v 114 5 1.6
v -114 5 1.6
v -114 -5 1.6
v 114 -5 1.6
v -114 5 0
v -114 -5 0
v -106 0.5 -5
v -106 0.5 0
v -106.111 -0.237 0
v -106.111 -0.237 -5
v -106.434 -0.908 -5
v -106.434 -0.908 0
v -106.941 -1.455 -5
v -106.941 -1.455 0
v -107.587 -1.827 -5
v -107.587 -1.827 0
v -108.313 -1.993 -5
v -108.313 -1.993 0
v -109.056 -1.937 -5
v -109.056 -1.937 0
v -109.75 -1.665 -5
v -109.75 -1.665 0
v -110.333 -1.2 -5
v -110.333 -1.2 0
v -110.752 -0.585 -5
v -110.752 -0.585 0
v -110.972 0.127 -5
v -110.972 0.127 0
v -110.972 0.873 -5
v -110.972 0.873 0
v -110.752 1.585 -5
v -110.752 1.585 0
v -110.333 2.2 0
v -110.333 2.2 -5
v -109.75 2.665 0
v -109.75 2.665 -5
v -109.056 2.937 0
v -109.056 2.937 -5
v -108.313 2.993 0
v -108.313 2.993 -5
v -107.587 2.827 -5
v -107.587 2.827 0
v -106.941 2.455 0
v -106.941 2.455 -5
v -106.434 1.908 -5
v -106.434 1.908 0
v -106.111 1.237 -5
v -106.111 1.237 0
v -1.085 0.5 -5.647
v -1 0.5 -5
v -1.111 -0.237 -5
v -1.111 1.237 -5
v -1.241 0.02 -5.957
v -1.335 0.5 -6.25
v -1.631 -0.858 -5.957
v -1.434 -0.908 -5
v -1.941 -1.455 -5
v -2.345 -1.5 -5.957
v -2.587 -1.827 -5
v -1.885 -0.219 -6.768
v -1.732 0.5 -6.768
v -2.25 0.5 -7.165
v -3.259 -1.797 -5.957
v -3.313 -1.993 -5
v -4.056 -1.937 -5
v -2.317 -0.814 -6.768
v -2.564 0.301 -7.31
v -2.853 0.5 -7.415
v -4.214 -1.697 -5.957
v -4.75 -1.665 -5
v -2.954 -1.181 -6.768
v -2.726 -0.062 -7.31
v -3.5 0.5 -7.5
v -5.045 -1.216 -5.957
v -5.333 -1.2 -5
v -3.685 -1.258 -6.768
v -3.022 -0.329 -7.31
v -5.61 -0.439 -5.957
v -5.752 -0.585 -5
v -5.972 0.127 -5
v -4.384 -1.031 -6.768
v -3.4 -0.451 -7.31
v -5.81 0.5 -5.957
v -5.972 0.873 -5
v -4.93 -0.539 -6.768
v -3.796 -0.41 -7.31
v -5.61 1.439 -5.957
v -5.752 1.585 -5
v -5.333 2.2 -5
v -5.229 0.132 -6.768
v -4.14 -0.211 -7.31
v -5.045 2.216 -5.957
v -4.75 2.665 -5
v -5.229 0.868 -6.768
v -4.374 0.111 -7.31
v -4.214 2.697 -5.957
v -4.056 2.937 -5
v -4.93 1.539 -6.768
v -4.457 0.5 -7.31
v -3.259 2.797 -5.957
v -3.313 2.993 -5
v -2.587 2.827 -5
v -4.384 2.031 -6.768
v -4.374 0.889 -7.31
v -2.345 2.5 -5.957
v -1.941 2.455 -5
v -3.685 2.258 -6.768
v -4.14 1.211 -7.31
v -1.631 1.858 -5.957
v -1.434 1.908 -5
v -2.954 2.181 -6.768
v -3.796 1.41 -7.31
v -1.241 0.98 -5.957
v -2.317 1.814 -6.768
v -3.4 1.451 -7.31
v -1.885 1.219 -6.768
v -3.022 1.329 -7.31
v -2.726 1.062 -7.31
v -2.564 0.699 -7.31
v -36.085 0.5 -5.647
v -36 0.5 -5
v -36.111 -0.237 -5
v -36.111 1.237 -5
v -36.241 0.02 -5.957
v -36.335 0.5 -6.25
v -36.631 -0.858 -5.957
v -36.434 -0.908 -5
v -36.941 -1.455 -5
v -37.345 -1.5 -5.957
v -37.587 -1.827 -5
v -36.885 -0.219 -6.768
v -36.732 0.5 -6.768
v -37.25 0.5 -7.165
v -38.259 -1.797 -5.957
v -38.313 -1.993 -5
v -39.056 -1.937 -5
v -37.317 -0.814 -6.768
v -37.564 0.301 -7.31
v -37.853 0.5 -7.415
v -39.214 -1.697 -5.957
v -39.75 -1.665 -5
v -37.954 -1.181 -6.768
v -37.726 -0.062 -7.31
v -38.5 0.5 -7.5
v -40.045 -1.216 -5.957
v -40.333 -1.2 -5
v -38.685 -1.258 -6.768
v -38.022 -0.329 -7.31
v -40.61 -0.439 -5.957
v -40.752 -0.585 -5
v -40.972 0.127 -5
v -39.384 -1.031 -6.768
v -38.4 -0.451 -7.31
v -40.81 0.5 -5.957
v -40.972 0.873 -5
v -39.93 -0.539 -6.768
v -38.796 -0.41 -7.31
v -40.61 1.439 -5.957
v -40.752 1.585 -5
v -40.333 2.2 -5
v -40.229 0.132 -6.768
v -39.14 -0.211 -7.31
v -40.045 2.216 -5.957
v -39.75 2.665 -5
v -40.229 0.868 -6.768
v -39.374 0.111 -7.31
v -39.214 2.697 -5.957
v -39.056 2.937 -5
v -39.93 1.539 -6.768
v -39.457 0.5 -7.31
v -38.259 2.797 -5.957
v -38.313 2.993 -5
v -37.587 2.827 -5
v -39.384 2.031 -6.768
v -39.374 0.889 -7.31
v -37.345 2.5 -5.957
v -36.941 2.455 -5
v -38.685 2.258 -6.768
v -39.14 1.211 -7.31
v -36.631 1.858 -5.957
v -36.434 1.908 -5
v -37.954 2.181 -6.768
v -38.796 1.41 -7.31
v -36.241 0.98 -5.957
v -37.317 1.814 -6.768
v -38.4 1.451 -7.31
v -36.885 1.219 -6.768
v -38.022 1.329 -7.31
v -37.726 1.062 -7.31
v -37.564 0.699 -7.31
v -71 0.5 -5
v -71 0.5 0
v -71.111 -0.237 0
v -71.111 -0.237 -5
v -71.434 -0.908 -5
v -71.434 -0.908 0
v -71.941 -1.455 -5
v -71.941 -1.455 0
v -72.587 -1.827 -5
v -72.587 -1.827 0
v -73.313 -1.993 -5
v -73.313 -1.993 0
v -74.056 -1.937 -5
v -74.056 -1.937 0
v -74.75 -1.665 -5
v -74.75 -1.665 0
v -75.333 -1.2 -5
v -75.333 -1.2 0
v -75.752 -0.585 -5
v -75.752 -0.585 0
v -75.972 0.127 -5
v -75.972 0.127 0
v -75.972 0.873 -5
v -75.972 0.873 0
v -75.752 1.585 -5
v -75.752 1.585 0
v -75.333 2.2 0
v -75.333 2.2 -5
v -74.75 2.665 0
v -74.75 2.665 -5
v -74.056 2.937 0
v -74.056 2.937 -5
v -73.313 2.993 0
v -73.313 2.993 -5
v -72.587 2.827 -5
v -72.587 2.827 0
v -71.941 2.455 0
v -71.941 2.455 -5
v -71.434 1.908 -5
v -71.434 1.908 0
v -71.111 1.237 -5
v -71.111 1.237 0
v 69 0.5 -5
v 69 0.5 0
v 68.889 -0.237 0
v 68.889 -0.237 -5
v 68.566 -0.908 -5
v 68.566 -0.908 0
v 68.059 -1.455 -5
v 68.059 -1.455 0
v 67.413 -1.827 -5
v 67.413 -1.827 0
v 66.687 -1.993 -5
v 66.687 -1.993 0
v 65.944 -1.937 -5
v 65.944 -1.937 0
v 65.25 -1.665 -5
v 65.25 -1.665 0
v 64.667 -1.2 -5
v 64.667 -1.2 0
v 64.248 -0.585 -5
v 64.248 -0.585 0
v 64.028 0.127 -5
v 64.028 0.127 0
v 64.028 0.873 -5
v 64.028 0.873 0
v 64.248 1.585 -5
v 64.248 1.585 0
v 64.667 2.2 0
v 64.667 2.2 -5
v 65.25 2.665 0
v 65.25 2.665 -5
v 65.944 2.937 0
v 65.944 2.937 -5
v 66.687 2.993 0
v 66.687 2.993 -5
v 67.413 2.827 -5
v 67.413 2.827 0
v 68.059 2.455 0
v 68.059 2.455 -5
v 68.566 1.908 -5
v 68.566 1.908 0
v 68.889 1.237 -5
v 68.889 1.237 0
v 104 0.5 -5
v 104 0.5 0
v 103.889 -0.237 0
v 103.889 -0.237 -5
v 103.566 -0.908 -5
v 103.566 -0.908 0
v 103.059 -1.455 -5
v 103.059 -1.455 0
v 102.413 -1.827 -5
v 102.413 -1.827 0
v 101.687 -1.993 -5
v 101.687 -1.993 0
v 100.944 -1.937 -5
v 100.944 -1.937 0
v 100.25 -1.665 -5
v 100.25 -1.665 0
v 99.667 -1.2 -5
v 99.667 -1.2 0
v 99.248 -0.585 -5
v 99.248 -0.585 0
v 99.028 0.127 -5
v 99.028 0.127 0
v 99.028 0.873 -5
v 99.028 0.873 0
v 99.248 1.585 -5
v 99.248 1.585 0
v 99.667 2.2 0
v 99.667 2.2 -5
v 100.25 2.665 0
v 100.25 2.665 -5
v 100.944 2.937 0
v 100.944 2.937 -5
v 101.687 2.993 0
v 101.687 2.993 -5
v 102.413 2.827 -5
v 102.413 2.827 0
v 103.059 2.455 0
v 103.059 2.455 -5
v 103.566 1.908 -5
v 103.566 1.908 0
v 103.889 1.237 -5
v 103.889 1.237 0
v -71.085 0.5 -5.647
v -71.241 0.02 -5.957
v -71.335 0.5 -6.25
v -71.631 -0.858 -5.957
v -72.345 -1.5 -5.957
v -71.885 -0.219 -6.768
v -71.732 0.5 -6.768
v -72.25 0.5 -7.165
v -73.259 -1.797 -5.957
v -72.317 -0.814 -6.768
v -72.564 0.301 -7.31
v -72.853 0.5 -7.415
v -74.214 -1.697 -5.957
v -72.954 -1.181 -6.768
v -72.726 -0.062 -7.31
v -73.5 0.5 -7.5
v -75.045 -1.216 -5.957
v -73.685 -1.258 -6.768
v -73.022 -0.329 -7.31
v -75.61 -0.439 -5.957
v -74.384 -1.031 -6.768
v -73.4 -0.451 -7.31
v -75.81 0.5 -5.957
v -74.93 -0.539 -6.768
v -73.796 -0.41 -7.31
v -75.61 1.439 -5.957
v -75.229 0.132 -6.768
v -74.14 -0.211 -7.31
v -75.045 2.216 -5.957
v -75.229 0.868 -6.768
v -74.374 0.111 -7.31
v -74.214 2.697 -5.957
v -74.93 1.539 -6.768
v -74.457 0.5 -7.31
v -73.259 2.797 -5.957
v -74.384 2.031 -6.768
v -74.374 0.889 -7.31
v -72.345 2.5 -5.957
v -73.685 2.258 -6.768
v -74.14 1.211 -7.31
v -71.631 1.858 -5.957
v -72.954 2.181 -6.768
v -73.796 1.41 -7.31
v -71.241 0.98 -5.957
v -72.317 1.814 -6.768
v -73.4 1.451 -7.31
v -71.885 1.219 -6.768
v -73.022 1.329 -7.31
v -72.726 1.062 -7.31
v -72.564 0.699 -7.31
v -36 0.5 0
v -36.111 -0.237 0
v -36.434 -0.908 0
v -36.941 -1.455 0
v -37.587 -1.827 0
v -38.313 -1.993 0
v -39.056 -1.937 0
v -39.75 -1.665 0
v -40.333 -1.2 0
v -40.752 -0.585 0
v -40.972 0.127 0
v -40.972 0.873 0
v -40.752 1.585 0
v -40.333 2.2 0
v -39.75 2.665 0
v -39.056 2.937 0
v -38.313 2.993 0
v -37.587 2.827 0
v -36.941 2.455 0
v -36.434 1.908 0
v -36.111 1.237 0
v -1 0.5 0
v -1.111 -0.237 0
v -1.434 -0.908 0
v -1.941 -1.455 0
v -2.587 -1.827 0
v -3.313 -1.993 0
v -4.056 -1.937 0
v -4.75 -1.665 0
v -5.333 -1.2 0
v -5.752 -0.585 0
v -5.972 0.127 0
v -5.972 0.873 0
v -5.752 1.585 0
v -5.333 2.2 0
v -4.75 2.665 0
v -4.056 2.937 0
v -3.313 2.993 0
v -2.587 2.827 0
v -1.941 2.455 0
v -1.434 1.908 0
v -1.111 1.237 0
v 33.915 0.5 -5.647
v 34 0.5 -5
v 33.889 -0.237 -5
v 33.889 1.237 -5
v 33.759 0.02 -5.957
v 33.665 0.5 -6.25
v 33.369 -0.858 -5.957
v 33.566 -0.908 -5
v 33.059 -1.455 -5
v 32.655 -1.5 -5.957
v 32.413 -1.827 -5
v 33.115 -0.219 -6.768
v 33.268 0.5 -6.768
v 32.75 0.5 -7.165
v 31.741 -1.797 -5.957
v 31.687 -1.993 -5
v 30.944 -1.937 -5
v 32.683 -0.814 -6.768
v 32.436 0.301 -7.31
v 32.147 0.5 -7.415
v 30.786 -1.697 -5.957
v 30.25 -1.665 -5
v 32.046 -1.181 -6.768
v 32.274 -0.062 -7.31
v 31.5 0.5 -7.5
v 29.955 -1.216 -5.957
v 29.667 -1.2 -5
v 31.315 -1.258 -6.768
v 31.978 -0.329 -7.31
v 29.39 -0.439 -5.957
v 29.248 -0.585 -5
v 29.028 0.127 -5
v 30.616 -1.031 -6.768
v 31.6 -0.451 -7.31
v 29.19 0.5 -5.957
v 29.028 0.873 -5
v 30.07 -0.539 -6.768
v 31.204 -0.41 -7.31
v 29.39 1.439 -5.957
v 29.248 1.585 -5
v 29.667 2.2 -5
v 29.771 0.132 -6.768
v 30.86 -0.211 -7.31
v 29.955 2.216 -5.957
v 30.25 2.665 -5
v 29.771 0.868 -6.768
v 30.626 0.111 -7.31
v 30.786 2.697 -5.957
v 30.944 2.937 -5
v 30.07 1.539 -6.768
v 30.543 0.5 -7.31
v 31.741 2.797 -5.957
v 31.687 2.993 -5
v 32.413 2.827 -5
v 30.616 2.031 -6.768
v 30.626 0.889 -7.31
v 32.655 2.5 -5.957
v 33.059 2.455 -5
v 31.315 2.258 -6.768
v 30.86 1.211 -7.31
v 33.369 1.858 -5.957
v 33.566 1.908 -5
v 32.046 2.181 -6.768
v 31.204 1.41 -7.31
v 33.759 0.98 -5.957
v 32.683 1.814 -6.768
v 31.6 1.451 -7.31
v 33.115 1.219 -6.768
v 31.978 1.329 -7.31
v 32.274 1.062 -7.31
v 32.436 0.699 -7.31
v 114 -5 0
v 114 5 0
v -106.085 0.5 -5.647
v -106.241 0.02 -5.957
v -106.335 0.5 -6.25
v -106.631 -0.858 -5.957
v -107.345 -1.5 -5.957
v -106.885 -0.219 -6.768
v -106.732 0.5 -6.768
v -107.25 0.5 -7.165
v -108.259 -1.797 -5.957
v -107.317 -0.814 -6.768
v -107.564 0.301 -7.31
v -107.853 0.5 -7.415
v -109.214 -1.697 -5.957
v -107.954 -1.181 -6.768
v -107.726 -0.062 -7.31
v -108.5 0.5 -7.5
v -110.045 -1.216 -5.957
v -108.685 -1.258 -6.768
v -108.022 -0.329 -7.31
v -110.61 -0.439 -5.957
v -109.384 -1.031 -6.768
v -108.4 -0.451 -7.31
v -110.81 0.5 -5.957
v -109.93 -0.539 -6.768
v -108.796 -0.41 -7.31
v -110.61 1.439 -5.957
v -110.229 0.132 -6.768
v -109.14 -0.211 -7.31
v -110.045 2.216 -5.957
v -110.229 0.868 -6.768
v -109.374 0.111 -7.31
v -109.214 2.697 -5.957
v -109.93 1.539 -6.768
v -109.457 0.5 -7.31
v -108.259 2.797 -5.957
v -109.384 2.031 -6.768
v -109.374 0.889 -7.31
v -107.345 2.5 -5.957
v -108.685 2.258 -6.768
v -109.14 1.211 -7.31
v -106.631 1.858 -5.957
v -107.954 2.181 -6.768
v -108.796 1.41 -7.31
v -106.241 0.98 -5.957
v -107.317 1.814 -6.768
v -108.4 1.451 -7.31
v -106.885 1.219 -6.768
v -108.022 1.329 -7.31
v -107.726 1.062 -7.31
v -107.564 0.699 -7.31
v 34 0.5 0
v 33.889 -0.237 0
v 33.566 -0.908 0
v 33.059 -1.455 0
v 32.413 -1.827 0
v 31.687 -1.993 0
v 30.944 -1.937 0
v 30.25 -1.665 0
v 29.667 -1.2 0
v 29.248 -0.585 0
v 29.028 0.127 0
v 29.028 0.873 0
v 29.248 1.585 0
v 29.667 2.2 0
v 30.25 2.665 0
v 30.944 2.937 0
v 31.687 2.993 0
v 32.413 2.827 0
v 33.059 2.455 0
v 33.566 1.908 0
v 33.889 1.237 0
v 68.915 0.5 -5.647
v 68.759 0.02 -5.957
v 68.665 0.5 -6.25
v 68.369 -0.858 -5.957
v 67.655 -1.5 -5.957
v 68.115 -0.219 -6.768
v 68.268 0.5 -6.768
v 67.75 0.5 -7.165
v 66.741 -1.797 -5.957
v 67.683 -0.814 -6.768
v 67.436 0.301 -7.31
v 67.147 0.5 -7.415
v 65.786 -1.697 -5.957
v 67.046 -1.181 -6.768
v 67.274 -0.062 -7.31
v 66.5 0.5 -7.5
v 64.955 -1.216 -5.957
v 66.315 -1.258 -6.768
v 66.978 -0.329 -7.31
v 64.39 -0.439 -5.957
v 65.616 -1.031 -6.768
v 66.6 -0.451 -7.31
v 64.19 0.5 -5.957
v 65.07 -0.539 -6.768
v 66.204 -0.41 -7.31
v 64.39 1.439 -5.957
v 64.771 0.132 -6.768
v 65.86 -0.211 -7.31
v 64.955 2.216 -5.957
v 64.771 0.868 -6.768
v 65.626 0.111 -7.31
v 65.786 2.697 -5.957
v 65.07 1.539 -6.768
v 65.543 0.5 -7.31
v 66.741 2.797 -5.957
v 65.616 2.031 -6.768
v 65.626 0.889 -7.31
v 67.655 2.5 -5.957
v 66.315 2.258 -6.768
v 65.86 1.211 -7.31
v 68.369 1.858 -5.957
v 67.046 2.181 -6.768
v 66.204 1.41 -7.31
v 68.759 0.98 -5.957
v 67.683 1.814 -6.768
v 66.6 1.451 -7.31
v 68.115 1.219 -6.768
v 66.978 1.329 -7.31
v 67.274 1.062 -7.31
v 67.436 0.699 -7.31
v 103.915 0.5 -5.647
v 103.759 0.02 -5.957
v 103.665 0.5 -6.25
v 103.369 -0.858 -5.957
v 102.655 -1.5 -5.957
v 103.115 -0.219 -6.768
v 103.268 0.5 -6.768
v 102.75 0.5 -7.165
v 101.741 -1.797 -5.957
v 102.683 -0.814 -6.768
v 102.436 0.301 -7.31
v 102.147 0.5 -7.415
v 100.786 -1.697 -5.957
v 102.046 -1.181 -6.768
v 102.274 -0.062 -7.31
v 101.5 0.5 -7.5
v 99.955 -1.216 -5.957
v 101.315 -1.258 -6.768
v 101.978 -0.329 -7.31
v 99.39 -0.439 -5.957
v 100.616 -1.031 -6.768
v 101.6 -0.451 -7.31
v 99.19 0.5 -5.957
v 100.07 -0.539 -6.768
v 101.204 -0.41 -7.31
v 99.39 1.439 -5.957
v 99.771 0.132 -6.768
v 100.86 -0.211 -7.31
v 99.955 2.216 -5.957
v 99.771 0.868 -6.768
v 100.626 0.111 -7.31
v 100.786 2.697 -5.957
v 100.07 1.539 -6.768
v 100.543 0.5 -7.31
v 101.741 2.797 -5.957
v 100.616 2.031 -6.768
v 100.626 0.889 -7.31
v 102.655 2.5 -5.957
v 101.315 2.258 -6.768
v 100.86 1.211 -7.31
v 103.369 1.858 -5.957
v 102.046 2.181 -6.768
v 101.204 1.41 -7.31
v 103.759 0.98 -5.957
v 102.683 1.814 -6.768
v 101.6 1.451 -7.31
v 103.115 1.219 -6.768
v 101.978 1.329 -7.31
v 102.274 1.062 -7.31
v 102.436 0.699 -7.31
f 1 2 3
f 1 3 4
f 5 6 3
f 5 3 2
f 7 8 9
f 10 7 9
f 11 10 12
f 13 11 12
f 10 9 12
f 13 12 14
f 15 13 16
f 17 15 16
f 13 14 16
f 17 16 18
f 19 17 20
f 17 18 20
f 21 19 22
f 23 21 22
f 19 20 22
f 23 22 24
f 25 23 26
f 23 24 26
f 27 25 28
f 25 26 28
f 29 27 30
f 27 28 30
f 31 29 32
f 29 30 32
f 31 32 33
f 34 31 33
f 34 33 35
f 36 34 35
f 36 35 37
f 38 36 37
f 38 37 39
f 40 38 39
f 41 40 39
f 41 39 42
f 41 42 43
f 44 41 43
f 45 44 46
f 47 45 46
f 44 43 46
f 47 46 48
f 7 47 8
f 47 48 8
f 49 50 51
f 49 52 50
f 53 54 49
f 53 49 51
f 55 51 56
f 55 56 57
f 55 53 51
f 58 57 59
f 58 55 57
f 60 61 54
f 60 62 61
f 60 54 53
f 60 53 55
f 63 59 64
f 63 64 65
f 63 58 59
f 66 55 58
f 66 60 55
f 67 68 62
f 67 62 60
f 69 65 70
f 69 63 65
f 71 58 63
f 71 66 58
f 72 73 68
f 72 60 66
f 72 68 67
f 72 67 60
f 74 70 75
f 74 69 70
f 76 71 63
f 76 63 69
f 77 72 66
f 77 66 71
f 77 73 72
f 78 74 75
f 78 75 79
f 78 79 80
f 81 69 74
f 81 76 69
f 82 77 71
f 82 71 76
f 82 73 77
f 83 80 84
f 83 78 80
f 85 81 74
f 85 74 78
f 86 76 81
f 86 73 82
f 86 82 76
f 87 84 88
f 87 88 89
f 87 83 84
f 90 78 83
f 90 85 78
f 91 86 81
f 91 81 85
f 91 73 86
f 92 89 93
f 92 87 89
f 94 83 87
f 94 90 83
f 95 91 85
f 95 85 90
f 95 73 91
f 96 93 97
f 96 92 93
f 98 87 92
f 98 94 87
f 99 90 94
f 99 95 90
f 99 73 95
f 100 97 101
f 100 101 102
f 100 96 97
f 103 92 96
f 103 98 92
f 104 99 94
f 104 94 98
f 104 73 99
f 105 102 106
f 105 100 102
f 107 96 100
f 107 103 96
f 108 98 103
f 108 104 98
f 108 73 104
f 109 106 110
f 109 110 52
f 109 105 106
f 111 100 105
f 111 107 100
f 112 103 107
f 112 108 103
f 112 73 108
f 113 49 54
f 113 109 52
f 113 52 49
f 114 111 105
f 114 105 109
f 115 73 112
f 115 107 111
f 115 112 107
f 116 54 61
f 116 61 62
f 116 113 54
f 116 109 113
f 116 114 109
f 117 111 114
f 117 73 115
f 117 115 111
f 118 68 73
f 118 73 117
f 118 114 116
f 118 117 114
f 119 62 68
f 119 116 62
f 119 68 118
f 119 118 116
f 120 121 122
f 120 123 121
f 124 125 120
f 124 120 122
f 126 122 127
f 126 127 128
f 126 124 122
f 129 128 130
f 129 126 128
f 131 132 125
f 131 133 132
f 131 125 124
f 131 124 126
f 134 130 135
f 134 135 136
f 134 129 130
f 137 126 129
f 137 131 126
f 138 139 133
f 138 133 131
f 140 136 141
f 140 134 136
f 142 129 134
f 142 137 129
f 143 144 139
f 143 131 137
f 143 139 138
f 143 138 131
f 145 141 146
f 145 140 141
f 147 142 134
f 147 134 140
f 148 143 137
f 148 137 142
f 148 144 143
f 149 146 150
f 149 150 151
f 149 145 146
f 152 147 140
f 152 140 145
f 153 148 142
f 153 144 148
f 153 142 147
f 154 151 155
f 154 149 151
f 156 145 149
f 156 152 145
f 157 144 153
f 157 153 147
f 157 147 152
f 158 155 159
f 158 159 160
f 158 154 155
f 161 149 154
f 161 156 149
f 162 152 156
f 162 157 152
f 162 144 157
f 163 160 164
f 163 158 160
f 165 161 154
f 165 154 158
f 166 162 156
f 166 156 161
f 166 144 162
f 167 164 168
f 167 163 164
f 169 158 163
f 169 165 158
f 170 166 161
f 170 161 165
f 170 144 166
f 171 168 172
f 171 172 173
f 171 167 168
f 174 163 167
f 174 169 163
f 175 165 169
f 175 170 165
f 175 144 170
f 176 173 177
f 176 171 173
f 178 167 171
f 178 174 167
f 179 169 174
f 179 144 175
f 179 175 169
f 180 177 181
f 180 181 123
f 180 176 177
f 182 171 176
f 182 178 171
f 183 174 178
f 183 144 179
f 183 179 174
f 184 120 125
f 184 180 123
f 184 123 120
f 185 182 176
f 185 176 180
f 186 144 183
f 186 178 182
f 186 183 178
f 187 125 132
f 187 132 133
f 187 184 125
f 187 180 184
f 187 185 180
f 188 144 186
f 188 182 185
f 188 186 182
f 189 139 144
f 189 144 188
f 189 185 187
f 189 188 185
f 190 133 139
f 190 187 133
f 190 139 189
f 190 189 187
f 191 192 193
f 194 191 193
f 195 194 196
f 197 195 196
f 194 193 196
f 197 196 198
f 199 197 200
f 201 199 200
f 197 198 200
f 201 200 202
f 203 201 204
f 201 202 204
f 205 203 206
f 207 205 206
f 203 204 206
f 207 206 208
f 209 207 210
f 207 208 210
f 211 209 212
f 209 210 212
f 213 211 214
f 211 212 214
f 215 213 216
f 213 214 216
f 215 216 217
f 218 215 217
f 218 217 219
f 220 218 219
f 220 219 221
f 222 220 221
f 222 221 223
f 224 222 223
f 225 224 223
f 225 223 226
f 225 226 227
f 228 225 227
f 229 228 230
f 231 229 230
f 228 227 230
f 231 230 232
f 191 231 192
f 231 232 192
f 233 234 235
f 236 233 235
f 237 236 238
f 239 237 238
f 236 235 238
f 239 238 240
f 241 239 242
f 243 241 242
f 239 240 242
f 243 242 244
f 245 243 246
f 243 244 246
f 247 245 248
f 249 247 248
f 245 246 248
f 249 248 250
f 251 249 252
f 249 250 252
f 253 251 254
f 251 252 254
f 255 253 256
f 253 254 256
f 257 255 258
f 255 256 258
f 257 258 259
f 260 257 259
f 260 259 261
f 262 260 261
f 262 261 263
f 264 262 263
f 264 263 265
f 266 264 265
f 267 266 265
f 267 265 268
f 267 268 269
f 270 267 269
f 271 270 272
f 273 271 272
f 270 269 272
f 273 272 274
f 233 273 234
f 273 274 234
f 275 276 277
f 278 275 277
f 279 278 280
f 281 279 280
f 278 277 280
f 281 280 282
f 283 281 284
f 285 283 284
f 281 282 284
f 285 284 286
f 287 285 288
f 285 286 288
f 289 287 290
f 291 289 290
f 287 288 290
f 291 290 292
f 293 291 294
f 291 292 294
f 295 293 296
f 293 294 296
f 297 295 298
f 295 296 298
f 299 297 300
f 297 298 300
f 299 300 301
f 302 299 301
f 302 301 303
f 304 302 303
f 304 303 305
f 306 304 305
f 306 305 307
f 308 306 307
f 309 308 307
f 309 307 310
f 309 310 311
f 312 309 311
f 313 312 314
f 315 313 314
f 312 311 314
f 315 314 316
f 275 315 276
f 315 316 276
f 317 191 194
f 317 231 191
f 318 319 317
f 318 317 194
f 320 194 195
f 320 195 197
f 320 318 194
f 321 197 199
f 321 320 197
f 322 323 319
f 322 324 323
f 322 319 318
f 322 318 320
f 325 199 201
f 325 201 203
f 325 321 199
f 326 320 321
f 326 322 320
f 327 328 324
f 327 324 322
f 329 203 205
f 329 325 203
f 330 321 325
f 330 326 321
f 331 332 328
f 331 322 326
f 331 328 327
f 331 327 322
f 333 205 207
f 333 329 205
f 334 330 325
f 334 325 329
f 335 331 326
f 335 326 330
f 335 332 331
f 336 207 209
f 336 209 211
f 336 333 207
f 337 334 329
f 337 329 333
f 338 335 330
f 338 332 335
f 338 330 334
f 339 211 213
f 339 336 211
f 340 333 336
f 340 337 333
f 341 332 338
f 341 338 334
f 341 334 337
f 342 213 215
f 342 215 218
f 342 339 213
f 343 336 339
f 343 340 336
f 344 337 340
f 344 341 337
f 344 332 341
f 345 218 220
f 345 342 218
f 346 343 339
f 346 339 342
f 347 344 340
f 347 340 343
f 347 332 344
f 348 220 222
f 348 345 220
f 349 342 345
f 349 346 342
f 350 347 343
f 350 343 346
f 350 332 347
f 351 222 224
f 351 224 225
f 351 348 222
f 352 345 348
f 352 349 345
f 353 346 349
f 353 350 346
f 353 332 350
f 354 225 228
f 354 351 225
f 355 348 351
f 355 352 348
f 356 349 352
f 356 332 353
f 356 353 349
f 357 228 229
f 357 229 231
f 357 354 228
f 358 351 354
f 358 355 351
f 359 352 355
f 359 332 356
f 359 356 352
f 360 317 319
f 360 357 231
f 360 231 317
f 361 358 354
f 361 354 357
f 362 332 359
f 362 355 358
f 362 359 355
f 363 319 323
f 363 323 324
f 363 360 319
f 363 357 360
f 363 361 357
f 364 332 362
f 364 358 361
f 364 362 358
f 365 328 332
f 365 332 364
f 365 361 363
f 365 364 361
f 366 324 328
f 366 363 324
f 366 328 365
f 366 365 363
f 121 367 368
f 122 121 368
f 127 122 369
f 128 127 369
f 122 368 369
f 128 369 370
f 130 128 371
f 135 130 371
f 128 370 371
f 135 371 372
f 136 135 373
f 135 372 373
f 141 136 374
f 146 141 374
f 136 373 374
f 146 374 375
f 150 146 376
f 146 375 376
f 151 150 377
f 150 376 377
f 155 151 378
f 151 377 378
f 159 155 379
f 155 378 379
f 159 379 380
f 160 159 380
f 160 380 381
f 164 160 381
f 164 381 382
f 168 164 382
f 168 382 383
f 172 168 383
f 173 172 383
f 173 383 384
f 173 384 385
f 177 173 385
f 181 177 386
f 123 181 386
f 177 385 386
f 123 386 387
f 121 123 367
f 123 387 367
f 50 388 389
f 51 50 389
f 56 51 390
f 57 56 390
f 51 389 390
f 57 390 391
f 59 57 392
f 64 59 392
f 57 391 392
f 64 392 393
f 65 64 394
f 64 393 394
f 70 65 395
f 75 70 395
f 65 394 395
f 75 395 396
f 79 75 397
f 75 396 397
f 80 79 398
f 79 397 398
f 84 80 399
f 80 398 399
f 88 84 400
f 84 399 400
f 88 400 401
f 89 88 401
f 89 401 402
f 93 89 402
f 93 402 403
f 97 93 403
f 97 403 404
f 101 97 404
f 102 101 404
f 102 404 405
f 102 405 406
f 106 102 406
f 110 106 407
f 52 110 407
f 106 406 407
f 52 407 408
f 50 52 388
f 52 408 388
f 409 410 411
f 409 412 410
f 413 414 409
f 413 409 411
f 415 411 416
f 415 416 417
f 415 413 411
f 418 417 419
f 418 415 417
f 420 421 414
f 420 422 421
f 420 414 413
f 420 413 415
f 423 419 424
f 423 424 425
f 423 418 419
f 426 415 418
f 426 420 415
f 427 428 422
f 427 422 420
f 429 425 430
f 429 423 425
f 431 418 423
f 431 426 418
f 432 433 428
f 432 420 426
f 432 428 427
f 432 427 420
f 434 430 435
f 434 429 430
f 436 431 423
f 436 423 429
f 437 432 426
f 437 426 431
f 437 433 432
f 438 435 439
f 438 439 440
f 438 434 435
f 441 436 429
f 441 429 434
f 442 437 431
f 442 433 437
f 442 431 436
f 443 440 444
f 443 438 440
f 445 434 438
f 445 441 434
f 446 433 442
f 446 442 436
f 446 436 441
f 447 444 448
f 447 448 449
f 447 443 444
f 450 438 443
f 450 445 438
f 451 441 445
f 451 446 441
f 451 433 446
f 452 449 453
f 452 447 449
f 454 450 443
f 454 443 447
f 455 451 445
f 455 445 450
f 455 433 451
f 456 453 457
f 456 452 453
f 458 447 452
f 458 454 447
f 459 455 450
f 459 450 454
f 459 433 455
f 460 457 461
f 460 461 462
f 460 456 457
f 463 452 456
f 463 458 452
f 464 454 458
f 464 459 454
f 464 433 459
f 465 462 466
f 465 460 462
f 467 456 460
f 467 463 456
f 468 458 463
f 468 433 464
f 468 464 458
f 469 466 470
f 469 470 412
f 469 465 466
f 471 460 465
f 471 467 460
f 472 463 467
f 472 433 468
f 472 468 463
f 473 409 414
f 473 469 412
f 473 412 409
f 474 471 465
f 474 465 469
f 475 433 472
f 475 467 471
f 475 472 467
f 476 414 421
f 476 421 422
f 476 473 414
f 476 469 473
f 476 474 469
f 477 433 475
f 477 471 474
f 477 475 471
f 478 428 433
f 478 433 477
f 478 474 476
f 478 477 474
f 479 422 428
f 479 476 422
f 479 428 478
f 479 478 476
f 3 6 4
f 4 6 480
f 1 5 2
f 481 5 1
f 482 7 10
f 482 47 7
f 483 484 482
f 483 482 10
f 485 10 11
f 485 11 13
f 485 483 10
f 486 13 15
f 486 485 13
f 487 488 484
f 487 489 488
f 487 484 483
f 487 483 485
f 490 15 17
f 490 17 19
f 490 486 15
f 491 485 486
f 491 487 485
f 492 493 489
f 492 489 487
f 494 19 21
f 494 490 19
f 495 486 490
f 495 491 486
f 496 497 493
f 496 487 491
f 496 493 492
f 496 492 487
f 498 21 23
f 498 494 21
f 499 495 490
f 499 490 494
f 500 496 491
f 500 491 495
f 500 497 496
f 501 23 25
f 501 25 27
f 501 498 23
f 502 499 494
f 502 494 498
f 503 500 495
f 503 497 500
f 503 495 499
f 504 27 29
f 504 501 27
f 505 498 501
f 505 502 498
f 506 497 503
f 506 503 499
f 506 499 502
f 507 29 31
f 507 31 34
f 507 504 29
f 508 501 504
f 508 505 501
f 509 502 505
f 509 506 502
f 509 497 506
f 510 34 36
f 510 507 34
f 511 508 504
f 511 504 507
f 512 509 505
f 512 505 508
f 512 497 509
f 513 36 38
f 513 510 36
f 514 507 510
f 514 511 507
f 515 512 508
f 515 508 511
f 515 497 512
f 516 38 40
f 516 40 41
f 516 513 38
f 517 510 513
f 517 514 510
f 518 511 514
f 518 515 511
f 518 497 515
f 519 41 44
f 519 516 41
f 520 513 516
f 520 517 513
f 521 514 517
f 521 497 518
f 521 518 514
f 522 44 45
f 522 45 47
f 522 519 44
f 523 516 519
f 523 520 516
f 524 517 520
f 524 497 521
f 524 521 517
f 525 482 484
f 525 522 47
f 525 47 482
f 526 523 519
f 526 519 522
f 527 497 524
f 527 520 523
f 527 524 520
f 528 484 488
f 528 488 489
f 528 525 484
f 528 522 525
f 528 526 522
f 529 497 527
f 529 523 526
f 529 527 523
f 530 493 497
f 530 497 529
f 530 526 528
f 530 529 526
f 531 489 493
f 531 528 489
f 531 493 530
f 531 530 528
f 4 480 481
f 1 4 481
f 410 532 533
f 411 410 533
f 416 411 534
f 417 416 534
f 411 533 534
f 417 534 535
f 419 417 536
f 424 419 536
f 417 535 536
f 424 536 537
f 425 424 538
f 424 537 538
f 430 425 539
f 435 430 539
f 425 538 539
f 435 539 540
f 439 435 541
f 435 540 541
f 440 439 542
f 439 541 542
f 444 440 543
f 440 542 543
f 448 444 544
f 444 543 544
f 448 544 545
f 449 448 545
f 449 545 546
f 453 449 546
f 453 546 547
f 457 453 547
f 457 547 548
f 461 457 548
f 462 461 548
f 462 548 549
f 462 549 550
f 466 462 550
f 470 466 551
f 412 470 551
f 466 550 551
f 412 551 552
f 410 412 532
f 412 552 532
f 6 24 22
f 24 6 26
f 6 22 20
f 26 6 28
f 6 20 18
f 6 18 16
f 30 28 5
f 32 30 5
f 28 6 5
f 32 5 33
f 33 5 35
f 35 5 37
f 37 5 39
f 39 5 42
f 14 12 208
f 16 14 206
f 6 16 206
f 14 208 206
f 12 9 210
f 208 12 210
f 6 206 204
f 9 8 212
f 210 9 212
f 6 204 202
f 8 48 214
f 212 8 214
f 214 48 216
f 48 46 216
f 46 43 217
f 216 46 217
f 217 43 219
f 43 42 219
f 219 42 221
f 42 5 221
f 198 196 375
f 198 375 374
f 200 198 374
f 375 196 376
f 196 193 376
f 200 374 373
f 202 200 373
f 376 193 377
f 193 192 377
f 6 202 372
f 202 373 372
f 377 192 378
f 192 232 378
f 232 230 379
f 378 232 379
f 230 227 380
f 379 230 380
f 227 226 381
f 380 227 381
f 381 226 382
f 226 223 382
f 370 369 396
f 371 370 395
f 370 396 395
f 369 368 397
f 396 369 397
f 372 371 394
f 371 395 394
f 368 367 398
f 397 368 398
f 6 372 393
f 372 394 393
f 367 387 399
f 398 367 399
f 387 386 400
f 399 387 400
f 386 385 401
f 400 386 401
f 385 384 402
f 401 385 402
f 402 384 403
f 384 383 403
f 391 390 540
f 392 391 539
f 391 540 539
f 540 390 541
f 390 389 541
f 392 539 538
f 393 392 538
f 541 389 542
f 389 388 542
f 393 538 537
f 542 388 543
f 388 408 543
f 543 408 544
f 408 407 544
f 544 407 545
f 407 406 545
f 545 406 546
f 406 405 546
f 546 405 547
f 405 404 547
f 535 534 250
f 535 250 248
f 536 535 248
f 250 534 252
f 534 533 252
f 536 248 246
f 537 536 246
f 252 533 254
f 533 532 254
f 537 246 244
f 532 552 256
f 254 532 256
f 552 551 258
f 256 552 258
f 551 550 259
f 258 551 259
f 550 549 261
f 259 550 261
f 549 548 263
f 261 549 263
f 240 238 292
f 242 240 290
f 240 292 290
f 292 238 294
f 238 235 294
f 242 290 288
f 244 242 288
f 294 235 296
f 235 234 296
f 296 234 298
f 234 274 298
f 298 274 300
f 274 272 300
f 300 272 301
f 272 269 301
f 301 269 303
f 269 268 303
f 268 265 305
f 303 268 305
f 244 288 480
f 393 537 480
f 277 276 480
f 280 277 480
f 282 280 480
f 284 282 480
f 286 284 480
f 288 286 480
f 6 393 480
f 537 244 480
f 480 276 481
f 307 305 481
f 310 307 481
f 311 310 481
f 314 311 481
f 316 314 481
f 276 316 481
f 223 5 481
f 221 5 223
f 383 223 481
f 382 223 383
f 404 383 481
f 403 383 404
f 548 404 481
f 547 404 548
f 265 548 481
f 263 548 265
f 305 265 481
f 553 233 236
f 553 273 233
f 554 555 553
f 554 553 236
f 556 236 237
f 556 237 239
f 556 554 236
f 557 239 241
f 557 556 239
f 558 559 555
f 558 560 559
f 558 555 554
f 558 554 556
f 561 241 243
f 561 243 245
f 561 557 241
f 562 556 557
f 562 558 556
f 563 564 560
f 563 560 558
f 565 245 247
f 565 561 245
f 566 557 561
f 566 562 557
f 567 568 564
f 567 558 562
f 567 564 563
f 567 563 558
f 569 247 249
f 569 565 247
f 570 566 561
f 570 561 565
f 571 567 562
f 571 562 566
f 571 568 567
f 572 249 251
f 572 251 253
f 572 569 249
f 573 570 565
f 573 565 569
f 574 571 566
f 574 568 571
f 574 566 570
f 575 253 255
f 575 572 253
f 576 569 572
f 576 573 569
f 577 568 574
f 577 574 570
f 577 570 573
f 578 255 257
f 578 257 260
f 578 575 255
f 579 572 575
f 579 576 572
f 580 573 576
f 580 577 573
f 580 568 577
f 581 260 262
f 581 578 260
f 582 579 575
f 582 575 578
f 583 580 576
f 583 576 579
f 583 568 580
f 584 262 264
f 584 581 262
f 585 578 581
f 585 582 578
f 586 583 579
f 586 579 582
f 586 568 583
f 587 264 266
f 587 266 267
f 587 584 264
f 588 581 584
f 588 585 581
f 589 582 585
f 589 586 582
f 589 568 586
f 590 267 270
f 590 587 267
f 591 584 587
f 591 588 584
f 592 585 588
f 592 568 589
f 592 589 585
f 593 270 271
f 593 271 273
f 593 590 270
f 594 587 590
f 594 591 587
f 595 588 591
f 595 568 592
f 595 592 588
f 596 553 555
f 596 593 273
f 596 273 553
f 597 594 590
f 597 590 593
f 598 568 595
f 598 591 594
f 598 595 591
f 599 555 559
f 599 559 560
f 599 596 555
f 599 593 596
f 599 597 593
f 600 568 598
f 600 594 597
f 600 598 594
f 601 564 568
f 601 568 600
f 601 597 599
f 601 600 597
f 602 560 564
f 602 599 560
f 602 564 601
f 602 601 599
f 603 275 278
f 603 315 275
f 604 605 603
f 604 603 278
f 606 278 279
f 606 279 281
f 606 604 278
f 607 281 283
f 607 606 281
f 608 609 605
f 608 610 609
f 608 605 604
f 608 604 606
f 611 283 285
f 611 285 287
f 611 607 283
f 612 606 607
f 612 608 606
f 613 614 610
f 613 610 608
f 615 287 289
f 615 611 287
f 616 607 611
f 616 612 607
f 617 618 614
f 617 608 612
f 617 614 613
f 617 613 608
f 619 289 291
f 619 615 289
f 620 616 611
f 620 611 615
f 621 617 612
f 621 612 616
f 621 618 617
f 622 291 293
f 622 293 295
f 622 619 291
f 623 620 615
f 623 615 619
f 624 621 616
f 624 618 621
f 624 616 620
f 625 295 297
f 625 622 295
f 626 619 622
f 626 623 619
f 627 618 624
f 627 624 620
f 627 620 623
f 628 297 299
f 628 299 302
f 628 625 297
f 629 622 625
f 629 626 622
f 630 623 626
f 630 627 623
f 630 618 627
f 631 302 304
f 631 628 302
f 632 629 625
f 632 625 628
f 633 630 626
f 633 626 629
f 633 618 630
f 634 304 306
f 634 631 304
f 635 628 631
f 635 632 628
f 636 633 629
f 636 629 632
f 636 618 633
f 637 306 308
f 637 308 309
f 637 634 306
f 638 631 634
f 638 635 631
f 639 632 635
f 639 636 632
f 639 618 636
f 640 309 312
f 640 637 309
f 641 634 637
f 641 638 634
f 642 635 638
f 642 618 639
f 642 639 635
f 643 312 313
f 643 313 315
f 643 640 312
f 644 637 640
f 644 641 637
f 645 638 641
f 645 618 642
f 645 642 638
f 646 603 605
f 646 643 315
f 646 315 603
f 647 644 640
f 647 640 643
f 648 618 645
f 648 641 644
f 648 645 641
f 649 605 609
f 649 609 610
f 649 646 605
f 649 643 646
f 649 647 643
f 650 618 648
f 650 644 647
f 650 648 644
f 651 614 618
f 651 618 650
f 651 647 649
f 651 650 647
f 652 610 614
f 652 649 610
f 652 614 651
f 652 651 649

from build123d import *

# Parameters (mm, degrees)
F0_W     = 228
F0_H     = 10
F1_DEPTH = 1.6
F2_R     = 2.5
F3_DEPTH = 7.5
F4_R     = 2.5


with BuildPart() as f1:
    # F0 (on Top) → F1 (new body)
    with BuildSketch(Plane.XY):
        Rectangle(F0_W, F0_H)
    extrude(amount=F1_DEPTH)

    # F2 (on face) → F3 (join)
    with BuildSketch(Plane(origin=(0, 0, 0), x_dir=(1, 0, 0), z_dir=(0, 0, -1))):
        with Locations((-108.5, -0.5)):
            Circle(F2_R)
        with Locations((-73.5, -0.5)):
            Circle(F2_R)
        with Locations((-38.5, -0.5)):
            Circle(F2_R)
        with Locations((-3.5, -0.5)):
            Circle(F2_R)
        with Locations((31.5, -0.5)):
            Circle(F2_R)
        with Locations((66.5, -0.5)):
            Circle(F2_R)
        with Locations((101.5, -0.5)):
            Circle(F2_R)
    extrude(amount=F3_DEPTH)

    # F4
    f4_edges = [f1.edges().sort_by_distance(p)[0] for p in [
        (-111, 0.5, -7.5),
        (-76, 0.5, -7.5),
        (-41, 0.5, -7.5),
        (-6, 0.5, -7.5),
        (29, 0.5, -7.5),
        (64, 0.5, -7.5),
        (99, 0.5, -7.5),
    ]]
    fillet(f4_edges, radius=F4_R)


solid = f1.part
